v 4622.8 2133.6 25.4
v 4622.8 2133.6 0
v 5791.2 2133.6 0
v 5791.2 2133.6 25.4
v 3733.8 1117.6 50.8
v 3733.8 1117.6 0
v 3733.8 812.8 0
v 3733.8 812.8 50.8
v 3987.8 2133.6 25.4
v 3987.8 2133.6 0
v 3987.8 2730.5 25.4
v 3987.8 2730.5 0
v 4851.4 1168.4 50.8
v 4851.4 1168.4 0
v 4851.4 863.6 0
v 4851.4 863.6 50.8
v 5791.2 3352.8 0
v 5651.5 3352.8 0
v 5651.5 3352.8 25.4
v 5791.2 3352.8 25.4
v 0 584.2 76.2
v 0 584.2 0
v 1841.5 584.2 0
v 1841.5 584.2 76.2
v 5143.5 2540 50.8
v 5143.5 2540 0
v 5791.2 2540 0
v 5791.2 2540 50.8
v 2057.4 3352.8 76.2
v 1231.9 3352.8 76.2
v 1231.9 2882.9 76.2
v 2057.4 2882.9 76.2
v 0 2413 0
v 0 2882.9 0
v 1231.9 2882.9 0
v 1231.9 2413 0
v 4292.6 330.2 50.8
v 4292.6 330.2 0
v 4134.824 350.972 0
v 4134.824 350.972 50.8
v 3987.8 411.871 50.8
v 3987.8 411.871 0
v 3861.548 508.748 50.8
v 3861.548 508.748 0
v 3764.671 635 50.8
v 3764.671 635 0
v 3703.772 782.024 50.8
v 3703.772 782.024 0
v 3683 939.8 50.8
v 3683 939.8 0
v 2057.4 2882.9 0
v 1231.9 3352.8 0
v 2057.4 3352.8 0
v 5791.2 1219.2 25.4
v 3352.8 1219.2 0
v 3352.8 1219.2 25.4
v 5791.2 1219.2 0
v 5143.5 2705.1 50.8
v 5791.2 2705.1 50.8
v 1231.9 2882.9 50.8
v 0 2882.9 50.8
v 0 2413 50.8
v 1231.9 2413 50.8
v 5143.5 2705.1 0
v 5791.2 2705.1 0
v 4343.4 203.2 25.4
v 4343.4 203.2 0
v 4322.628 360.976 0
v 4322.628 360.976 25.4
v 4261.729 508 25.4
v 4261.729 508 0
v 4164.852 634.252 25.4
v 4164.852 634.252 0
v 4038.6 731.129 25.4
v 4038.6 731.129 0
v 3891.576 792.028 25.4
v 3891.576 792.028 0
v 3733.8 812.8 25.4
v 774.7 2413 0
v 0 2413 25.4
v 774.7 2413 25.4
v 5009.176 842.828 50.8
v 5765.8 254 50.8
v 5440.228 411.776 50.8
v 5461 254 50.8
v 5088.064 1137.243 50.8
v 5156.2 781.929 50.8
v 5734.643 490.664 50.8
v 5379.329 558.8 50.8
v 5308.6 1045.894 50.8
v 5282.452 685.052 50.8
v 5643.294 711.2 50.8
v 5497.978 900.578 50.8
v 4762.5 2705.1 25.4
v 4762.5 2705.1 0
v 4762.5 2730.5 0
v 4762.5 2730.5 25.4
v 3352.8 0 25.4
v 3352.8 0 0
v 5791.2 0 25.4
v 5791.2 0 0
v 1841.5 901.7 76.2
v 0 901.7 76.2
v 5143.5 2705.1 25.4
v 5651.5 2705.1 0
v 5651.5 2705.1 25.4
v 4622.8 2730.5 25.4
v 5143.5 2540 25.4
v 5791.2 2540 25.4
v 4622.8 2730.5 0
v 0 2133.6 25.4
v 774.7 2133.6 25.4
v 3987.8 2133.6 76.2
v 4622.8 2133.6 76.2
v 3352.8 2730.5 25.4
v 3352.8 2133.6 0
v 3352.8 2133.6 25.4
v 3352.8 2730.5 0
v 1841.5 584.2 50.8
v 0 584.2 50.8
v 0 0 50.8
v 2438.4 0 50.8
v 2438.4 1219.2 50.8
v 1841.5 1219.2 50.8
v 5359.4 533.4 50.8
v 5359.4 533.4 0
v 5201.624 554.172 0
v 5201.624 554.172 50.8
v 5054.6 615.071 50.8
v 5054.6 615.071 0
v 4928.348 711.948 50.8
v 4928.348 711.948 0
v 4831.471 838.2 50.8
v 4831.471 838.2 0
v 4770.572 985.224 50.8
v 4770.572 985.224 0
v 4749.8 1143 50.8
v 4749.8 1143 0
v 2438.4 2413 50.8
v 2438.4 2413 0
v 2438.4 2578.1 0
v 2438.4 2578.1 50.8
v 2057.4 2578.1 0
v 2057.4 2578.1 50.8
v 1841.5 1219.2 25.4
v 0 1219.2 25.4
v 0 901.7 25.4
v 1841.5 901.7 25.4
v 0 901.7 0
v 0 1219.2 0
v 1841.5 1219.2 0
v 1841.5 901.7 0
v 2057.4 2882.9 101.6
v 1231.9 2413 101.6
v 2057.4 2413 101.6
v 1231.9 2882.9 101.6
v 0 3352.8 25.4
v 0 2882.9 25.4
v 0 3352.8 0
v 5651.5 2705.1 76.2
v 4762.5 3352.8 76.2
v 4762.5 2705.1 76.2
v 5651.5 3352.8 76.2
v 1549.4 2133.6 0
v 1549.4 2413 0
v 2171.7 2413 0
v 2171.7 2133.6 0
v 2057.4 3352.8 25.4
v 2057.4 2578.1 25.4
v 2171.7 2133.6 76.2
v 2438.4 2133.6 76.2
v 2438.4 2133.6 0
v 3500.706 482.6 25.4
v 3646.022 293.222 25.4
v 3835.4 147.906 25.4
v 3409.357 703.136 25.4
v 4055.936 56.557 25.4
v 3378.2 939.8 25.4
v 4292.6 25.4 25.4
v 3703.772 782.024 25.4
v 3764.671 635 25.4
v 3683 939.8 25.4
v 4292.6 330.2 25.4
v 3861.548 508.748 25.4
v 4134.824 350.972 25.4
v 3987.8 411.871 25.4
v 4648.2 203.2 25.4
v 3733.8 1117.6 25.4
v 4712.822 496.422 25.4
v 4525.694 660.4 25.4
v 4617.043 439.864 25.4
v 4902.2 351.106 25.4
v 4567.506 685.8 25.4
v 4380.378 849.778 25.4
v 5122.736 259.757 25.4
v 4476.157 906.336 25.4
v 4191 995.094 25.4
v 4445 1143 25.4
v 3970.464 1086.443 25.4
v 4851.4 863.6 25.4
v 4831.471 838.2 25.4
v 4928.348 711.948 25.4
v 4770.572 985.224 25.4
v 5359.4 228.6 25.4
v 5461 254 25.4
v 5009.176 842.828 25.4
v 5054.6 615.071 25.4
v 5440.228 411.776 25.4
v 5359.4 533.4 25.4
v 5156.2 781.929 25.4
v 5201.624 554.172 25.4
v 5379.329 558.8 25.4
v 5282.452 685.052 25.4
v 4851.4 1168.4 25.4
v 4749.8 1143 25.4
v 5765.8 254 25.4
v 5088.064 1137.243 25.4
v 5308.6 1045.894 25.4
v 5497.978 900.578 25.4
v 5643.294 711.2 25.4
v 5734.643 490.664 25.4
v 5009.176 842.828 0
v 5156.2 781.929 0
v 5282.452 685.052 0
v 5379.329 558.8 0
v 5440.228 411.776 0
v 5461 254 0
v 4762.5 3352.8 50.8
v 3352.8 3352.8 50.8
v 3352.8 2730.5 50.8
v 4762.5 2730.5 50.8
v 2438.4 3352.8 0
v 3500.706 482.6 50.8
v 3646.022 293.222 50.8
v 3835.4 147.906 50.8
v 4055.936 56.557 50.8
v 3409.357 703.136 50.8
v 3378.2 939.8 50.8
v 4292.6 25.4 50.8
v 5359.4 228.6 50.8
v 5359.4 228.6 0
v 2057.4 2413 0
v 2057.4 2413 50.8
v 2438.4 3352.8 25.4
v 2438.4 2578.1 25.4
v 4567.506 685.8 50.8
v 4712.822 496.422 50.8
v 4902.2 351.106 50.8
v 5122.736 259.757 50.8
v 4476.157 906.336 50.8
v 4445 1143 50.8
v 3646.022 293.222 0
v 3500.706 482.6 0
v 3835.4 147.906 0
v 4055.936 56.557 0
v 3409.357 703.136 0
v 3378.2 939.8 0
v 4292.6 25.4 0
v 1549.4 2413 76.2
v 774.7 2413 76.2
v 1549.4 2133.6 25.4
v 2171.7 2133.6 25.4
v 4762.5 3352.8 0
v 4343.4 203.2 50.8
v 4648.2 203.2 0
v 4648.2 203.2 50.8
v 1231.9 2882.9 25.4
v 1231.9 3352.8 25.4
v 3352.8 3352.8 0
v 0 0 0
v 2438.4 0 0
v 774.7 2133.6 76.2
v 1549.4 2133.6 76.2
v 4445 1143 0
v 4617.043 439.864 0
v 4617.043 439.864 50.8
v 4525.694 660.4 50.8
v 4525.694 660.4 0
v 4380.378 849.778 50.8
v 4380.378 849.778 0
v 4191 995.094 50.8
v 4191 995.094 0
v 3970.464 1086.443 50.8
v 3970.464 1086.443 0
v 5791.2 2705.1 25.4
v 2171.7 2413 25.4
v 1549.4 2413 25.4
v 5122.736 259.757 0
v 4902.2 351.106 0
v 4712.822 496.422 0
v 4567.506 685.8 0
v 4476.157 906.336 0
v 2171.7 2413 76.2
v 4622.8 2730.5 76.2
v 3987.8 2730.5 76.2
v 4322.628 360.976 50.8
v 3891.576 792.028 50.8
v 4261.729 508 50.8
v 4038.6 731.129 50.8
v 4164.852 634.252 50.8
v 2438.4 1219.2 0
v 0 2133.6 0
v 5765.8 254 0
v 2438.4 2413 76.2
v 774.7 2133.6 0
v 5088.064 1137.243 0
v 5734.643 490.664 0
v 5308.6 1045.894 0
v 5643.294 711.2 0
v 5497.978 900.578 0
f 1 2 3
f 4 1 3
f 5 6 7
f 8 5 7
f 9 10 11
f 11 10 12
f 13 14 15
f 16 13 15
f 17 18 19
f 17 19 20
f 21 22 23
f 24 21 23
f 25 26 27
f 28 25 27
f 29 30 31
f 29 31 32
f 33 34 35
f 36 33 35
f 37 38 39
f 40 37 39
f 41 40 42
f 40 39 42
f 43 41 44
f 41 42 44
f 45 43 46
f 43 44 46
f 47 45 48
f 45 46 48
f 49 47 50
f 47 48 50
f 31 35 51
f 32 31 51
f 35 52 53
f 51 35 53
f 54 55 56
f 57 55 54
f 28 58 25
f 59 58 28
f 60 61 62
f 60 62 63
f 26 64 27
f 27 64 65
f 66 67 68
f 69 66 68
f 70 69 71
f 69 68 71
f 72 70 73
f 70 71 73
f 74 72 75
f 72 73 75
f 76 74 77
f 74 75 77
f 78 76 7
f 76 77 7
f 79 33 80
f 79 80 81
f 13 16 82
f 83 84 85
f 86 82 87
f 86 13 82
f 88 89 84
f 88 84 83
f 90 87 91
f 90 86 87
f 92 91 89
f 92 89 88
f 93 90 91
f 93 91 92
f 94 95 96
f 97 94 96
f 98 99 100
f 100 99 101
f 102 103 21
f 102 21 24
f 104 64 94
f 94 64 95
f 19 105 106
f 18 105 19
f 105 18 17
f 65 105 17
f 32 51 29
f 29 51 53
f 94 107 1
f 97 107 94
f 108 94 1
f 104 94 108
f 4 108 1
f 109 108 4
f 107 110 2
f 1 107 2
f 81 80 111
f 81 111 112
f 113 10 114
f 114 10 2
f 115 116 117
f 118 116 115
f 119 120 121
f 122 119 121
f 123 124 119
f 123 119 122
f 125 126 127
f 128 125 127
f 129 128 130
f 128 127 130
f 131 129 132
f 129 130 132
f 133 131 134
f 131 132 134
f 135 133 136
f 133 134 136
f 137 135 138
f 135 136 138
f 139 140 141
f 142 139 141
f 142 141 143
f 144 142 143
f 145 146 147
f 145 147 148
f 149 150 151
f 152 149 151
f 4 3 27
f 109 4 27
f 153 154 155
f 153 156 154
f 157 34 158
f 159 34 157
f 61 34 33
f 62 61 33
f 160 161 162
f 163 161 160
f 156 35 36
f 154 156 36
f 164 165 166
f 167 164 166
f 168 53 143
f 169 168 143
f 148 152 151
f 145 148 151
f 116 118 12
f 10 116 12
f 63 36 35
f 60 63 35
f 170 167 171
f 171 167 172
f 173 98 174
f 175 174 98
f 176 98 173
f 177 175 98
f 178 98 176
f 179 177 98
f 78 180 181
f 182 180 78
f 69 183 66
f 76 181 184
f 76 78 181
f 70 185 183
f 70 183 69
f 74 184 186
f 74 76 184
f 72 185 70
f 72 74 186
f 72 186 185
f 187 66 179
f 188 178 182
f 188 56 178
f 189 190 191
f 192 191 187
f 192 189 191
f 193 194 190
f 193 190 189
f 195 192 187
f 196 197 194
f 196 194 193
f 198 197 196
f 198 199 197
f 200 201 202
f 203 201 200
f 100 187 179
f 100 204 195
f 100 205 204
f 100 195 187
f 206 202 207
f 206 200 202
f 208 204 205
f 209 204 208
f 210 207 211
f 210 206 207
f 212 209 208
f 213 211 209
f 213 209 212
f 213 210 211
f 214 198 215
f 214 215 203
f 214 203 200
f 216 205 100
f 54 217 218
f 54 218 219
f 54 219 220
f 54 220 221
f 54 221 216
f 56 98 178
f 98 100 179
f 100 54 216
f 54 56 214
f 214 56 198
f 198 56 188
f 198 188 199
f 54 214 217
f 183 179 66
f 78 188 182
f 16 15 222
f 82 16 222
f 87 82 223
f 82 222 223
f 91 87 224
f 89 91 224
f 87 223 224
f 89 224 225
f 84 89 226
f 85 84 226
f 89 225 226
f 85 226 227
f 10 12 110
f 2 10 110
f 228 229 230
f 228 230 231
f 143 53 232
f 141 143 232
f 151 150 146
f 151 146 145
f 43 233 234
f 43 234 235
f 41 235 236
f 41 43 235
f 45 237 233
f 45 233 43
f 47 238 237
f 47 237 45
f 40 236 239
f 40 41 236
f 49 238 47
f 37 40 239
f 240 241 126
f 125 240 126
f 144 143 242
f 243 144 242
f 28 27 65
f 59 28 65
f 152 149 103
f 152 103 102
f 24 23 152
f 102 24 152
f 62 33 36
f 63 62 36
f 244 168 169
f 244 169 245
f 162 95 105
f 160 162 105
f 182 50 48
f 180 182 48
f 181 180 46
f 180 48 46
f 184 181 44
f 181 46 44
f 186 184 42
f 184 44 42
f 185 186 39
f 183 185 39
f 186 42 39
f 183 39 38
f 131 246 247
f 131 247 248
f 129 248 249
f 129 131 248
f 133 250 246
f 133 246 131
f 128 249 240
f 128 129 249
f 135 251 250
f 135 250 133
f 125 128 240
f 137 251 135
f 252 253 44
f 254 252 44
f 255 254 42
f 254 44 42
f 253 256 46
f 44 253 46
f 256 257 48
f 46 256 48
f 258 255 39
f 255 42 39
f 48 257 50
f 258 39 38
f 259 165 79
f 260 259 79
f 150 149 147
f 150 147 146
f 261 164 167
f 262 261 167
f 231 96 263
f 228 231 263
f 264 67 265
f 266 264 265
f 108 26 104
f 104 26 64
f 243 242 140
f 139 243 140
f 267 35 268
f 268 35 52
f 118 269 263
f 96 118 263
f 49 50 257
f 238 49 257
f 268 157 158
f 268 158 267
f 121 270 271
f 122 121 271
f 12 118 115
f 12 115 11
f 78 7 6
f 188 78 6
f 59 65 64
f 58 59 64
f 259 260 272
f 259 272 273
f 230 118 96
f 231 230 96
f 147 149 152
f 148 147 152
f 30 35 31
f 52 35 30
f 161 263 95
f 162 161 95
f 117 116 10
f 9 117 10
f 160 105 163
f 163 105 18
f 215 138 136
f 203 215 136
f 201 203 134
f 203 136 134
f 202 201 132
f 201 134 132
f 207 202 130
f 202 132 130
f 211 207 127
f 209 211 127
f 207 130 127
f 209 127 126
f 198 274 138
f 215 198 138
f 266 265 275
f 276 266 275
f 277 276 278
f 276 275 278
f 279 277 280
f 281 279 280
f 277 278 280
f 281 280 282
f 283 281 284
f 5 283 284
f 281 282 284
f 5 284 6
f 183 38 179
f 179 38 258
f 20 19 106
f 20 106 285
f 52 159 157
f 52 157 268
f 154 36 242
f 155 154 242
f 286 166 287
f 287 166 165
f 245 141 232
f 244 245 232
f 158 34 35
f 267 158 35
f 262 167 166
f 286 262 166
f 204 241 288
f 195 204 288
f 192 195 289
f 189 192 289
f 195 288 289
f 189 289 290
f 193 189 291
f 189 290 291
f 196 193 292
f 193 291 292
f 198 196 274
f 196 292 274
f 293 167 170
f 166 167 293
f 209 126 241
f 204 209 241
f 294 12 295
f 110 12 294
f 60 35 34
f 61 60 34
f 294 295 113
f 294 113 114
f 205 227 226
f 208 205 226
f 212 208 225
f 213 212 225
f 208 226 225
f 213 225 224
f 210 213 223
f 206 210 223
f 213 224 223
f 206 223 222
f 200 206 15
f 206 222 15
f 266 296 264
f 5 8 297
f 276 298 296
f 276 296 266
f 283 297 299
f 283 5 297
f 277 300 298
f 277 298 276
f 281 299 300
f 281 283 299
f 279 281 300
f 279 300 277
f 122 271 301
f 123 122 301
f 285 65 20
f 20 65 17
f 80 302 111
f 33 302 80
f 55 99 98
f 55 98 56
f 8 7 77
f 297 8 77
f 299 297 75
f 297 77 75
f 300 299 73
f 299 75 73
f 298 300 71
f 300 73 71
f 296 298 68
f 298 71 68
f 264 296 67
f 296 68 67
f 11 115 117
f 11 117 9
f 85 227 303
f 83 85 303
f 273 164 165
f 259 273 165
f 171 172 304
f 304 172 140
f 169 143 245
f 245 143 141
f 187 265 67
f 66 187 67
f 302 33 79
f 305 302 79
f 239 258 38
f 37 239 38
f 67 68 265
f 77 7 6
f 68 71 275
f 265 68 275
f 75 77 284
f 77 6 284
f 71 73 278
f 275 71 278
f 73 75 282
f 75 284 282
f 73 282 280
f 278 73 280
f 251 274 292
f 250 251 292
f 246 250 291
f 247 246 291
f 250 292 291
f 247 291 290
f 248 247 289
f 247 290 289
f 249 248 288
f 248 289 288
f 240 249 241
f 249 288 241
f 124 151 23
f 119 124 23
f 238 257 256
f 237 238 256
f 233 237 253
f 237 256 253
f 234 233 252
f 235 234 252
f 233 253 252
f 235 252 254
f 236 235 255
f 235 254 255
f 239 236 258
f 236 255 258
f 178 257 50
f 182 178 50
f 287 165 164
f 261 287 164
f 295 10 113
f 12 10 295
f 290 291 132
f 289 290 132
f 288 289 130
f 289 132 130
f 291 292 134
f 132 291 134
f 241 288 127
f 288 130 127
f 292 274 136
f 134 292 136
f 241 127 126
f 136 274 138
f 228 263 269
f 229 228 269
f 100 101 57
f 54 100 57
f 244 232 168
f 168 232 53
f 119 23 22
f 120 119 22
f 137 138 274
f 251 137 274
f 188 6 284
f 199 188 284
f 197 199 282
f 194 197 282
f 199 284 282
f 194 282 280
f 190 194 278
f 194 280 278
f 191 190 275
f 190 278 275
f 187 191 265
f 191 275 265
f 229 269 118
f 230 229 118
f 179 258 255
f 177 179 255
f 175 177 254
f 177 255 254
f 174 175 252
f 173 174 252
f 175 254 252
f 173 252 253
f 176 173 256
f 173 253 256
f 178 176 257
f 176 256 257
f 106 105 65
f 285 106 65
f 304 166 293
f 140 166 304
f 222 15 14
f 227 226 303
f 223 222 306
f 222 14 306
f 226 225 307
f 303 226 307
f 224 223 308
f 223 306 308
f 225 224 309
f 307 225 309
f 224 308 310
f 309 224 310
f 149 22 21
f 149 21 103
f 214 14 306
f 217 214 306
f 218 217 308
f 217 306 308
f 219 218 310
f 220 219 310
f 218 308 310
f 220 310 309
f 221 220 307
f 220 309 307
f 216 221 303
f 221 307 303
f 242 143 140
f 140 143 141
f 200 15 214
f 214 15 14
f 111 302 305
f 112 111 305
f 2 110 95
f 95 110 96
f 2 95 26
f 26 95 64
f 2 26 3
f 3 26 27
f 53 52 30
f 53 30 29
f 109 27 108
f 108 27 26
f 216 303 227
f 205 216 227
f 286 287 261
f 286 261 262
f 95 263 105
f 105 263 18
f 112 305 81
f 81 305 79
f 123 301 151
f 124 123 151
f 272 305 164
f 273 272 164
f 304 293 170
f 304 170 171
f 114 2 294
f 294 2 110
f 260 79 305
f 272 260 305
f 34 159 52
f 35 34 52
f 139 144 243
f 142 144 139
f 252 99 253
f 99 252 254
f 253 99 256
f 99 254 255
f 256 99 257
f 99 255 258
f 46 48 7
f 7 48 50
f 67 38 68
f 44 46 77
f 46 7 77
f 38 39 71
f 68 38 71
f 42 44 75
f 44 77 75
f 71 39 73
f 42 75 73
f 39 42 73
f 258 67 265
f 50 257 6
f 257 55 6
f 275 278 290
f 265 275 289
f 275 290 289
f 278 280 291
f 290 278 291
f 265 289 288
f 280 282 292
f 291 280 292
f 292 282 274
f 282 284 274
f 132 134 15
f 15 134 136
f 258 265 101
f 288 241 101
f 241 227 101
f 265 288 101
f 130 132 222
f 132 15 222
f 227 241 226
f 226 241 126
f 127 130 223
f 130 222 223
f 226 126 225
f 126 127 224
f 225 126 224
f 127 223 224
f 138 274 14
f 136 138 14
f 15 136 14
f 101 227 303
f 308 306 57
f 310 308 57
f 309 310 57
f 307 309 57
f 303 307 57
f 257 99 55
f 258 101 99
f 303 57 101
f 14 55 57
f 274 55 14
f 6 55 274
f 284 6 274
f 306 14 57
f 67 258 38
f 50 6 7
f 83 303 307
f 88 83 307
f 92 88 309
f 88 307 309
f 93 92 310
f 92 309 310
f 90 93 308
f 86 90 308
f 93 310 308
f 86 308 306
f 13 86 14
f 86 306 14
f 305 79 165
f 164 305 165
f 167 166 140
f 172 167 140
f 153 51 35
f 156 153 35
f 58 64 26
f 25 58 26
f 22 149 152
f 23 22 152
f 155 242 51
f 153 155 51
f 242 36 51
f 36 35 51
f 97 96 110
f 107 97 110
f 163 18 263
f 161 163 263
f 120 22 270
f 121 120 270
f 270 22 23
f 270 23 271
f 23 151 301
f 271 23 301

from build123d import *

# Parameters (mm, degrees)
F0_W     = 1231.9
F0_H     = 469.9
F0_W_2   = 774.7
F0_H_2   = 279.4
F0_W_3   = 1841.5
F0_H_3   = 317.5
F0_W_4   = 635
F0_H_4   = 596.9
F0_W_5   = 139.7
F0_H_5   = 647.7
F0_W_6   = 2438.4
F0_H_6   = 1219.2
F1_DEPTH = 25.4
F2_DEPTH = 50.8
F0_W_7   = 825.5
F0_W_8   = 266.7
F3_DEPTH = 76.2
F4_DEPTH = 101.6


with BuildPart() as f1:
    # F0 (on Top) → F1 (new body)
    with BuildSketch(Plane.XY):
        with Locations((615.95, 3117.85)):
            Rectangle(F0_W, F0_H)
        with Locations((387.35, 2273.3)):
            Rectangle(F0_W_2, F0_H_2)
        Polygon((1549.4, 2413), (1549.4, 2133.6), (2171.7, 2133.6), (2171.7, 2413), (2057.4, 2413), align=None)
        Polygon((2057.4, 3352.8), (2057.4, 2882.9), (2057.4, 2578.1), (2438.4, 2578.1), (2438.4, 3352.8), align=None)
        with Locations((920.75, 1060.45)):
            Rectangle(F0_W_3, F0_H_3)
        with Locations((3670.3, 2432.05)):
            Rectangle(F0_W_4, F0_H_4)
        Polygon((4622.8, 2730.5), (4622.8, 2133.6), (5791.2, 2133.6), (5791.2, 2540), (5143.5, 2540), (5143.5, 2705.1), (4762.5, 2705.1), (4762.5, 2730.5), align=None)
        with Locations((5721.35, 3028.95)):
            Rectangle(F0_W_5, F0_H_5)
        with Locations((4572, 609.6)):
            Rectangle(F0_W_6, F0_H_6)
        with BuildLine():
            ThreePointArc((4292.6, 25.4), (3646.021559, 293.221559), (3378.2, 939.8))
            Line((3378.2, 939.8), (3683, 939.8))
            ThreePointArc((3683, 939.8), (3861.547706, 508.747706), (4292.6, 330.2))
            Line((4292.6, 330.2), (4292.6, 25.4))
        make_face(mode=Mode.SUBTRACT)
        with BuildLine():
            ThreePointArc((3733.8, 1117.6), (4380.378441, 849.778441), (4648.2, 203.2))
            Line((4648.2, 203.2), (4343.4, 203.2))
            ThreePointArc((4343.4, 203.2), (4164.852294, 634.252294), (3733.8, 812.8))
            Line((3733.8, 812.8), (3733.8, 1117.6))
        make_face(mode=Mode.SUBTRACT)
        with BuildLine():
            ThreePointArc((5359.4, 228.6), (4712.821559, 496.421559), (4445, 1143))
            Line((4445, 1143), (4749.8, 1143))
            ThreePointArc((4749.8, 1143), (4928.347706, 711.947706), (5359.4, 533.4))
            Line((5359.4, 533.4), (5359.4, 228.6))
        make_face(mode=Mode.SUBTRACT)
        with BuildLine():
            ThreePointArc((4851.4, 1168.4), (5497.978441, 900.578441), (5765.8, 254))
            Line((5765.8, 254), (5461, 254))
            ThreePointArc((5461, 254), (5282.452294, 685.052294), (4851.4, 863.6))
            Line((4851.4, 863.6), (4851.4, 1168.4))
        make_face(mode=Mode.SUBTRACT)
    extrude(amount=F1_DEPTH)


with BuildPart() as f2:
    # F0 (on Top) → F2 (new body)
    with BuildSketch(Plane.XY):
        Polygon((0, 2882.9), (0, 2413), (774.7, 2413), (1231.9, 2413), (1231.9, 2882.9), align=None)
        Polygon((2057.4, 2413), (2171.7, 2413), (2438.4, 2413), (2438.4, 2578.1), (2057.4, 2578.1), align=None)
        Polygon((0, 584.2), (0, 0), (2438.4, 0), (2438.4, 1219.2), (1841.5, 1219.2), (1841.5, 901.7), (1841.5, 584.2), align=None)
        Polygon((3352.8, 3352.8), (3352.8, 2730.5), (3987.8, 2730.5), (4622.8, 2730.5), (4762.5, 2730.5), (4762.5, 3352.8), align=None)
        Polygon((5143.5, 2540), (5791.2, 2540), (5791.2, 2705.1), (5651.5, 2705.1), (5143.5, 2705.1), align=None)
        with BuildLine():
            Line((3683, 939.8), (3378.2, 939.8))
            ThreePointArc((3378.2, 939.8), (3646.021559, 293.221559), (4292.6, 25.4))
            Line((4292.6, 25.4), (4292.6, 330.2))
            ThreePointArc((4292.6, 330.2), (3861.547706, 508.747706), (3683, 939.8))
        make_face()
        with BuildLine():
            Line((4343.4, 203.2), (4648.2, 203.2))
            ThreePointArc((4648.2, 203.2), (4380.378441, 849.778441), (3733.8, 1117.6))
            Line((3733.8, 1117.6), (3733.8, 812.8))
            ThreePointArc((3733.8, 812.8), (4164.852294, 634.252294), (4343.4, 203.2))
        make_face()
        with BuildLine():
            Line((4749.8, 1143), (4445, 1143))
            ThreePointArc((4445, 1143), (4712.821559, 496.421559), (5359.4, 228.6))
            Line((5359.4, 228.6), (5359.4, 533.4))
            ThreePointArc((5359.4, 533.4), (4928.347706, 711.947706), (4749.8, 1143))
        make_face()
        with BuildLine():
            Line((5461, 254), (5765.8, 254))
            ThreePointArc((5765.8, 254), (5497.978441, 900.578441), (4851.4, 1168.4))
            Line((4851.4, 1168.4), (4851.4, 863.6))
            ThreePointArc((4851.4, 863.6), (5282.452294, 685.052294), (5461, 254))
        make_face()
    extrude(amount=F2_DEPTH)


with BuildPart() as f3:
    # F0 (on Top) → F3 (new body)
    with BuildSketch(Plane.XY):
        with Locations((1644.65, 3117.85)):
            Rectangle(F0_W_7, F0_H)
        Polygon((774.7, 2413), (774.7, 2133.6), (1549.4, 2133.6), (1549.4, 2413), (1231.9, 2413), align=None)
        with Locations((2305.05, 2273.3)):
            Rectangle(F0_W_8, F0_H_2)
        with Locations((920.75, 742.95)):
            Rectangle(F0_W_3, F0_H_3)
        with Locations((4305.3, 2432.05)):
            Rectangle(F0_W_4, F0_H_4)
        Polygon((5651.5, 3352.8), (4762.5, 3352.8), (4762.5, 2730.5), (4762.5, 2705.1), (5143.5, 2705.1), (5651.5, 2705.1), align=None)
    extrude(amount=F3_DEPTH)


with BuildPart() as f4:
    # F0 (on Top) → F4 (new body)
    with BuildSketch(Plane.XY):
        Polygon((1231.9, 2413), (1549.4, 2413), (2057.4, 2413), (2057.4, 2578.1), (2057.4, 2882.9), (1231.9, 2882.9), align=None)
    extrude(amount=F4_DEPTH)


solid = Compound([f1.part, f2.part, f3.part, f4.part])
